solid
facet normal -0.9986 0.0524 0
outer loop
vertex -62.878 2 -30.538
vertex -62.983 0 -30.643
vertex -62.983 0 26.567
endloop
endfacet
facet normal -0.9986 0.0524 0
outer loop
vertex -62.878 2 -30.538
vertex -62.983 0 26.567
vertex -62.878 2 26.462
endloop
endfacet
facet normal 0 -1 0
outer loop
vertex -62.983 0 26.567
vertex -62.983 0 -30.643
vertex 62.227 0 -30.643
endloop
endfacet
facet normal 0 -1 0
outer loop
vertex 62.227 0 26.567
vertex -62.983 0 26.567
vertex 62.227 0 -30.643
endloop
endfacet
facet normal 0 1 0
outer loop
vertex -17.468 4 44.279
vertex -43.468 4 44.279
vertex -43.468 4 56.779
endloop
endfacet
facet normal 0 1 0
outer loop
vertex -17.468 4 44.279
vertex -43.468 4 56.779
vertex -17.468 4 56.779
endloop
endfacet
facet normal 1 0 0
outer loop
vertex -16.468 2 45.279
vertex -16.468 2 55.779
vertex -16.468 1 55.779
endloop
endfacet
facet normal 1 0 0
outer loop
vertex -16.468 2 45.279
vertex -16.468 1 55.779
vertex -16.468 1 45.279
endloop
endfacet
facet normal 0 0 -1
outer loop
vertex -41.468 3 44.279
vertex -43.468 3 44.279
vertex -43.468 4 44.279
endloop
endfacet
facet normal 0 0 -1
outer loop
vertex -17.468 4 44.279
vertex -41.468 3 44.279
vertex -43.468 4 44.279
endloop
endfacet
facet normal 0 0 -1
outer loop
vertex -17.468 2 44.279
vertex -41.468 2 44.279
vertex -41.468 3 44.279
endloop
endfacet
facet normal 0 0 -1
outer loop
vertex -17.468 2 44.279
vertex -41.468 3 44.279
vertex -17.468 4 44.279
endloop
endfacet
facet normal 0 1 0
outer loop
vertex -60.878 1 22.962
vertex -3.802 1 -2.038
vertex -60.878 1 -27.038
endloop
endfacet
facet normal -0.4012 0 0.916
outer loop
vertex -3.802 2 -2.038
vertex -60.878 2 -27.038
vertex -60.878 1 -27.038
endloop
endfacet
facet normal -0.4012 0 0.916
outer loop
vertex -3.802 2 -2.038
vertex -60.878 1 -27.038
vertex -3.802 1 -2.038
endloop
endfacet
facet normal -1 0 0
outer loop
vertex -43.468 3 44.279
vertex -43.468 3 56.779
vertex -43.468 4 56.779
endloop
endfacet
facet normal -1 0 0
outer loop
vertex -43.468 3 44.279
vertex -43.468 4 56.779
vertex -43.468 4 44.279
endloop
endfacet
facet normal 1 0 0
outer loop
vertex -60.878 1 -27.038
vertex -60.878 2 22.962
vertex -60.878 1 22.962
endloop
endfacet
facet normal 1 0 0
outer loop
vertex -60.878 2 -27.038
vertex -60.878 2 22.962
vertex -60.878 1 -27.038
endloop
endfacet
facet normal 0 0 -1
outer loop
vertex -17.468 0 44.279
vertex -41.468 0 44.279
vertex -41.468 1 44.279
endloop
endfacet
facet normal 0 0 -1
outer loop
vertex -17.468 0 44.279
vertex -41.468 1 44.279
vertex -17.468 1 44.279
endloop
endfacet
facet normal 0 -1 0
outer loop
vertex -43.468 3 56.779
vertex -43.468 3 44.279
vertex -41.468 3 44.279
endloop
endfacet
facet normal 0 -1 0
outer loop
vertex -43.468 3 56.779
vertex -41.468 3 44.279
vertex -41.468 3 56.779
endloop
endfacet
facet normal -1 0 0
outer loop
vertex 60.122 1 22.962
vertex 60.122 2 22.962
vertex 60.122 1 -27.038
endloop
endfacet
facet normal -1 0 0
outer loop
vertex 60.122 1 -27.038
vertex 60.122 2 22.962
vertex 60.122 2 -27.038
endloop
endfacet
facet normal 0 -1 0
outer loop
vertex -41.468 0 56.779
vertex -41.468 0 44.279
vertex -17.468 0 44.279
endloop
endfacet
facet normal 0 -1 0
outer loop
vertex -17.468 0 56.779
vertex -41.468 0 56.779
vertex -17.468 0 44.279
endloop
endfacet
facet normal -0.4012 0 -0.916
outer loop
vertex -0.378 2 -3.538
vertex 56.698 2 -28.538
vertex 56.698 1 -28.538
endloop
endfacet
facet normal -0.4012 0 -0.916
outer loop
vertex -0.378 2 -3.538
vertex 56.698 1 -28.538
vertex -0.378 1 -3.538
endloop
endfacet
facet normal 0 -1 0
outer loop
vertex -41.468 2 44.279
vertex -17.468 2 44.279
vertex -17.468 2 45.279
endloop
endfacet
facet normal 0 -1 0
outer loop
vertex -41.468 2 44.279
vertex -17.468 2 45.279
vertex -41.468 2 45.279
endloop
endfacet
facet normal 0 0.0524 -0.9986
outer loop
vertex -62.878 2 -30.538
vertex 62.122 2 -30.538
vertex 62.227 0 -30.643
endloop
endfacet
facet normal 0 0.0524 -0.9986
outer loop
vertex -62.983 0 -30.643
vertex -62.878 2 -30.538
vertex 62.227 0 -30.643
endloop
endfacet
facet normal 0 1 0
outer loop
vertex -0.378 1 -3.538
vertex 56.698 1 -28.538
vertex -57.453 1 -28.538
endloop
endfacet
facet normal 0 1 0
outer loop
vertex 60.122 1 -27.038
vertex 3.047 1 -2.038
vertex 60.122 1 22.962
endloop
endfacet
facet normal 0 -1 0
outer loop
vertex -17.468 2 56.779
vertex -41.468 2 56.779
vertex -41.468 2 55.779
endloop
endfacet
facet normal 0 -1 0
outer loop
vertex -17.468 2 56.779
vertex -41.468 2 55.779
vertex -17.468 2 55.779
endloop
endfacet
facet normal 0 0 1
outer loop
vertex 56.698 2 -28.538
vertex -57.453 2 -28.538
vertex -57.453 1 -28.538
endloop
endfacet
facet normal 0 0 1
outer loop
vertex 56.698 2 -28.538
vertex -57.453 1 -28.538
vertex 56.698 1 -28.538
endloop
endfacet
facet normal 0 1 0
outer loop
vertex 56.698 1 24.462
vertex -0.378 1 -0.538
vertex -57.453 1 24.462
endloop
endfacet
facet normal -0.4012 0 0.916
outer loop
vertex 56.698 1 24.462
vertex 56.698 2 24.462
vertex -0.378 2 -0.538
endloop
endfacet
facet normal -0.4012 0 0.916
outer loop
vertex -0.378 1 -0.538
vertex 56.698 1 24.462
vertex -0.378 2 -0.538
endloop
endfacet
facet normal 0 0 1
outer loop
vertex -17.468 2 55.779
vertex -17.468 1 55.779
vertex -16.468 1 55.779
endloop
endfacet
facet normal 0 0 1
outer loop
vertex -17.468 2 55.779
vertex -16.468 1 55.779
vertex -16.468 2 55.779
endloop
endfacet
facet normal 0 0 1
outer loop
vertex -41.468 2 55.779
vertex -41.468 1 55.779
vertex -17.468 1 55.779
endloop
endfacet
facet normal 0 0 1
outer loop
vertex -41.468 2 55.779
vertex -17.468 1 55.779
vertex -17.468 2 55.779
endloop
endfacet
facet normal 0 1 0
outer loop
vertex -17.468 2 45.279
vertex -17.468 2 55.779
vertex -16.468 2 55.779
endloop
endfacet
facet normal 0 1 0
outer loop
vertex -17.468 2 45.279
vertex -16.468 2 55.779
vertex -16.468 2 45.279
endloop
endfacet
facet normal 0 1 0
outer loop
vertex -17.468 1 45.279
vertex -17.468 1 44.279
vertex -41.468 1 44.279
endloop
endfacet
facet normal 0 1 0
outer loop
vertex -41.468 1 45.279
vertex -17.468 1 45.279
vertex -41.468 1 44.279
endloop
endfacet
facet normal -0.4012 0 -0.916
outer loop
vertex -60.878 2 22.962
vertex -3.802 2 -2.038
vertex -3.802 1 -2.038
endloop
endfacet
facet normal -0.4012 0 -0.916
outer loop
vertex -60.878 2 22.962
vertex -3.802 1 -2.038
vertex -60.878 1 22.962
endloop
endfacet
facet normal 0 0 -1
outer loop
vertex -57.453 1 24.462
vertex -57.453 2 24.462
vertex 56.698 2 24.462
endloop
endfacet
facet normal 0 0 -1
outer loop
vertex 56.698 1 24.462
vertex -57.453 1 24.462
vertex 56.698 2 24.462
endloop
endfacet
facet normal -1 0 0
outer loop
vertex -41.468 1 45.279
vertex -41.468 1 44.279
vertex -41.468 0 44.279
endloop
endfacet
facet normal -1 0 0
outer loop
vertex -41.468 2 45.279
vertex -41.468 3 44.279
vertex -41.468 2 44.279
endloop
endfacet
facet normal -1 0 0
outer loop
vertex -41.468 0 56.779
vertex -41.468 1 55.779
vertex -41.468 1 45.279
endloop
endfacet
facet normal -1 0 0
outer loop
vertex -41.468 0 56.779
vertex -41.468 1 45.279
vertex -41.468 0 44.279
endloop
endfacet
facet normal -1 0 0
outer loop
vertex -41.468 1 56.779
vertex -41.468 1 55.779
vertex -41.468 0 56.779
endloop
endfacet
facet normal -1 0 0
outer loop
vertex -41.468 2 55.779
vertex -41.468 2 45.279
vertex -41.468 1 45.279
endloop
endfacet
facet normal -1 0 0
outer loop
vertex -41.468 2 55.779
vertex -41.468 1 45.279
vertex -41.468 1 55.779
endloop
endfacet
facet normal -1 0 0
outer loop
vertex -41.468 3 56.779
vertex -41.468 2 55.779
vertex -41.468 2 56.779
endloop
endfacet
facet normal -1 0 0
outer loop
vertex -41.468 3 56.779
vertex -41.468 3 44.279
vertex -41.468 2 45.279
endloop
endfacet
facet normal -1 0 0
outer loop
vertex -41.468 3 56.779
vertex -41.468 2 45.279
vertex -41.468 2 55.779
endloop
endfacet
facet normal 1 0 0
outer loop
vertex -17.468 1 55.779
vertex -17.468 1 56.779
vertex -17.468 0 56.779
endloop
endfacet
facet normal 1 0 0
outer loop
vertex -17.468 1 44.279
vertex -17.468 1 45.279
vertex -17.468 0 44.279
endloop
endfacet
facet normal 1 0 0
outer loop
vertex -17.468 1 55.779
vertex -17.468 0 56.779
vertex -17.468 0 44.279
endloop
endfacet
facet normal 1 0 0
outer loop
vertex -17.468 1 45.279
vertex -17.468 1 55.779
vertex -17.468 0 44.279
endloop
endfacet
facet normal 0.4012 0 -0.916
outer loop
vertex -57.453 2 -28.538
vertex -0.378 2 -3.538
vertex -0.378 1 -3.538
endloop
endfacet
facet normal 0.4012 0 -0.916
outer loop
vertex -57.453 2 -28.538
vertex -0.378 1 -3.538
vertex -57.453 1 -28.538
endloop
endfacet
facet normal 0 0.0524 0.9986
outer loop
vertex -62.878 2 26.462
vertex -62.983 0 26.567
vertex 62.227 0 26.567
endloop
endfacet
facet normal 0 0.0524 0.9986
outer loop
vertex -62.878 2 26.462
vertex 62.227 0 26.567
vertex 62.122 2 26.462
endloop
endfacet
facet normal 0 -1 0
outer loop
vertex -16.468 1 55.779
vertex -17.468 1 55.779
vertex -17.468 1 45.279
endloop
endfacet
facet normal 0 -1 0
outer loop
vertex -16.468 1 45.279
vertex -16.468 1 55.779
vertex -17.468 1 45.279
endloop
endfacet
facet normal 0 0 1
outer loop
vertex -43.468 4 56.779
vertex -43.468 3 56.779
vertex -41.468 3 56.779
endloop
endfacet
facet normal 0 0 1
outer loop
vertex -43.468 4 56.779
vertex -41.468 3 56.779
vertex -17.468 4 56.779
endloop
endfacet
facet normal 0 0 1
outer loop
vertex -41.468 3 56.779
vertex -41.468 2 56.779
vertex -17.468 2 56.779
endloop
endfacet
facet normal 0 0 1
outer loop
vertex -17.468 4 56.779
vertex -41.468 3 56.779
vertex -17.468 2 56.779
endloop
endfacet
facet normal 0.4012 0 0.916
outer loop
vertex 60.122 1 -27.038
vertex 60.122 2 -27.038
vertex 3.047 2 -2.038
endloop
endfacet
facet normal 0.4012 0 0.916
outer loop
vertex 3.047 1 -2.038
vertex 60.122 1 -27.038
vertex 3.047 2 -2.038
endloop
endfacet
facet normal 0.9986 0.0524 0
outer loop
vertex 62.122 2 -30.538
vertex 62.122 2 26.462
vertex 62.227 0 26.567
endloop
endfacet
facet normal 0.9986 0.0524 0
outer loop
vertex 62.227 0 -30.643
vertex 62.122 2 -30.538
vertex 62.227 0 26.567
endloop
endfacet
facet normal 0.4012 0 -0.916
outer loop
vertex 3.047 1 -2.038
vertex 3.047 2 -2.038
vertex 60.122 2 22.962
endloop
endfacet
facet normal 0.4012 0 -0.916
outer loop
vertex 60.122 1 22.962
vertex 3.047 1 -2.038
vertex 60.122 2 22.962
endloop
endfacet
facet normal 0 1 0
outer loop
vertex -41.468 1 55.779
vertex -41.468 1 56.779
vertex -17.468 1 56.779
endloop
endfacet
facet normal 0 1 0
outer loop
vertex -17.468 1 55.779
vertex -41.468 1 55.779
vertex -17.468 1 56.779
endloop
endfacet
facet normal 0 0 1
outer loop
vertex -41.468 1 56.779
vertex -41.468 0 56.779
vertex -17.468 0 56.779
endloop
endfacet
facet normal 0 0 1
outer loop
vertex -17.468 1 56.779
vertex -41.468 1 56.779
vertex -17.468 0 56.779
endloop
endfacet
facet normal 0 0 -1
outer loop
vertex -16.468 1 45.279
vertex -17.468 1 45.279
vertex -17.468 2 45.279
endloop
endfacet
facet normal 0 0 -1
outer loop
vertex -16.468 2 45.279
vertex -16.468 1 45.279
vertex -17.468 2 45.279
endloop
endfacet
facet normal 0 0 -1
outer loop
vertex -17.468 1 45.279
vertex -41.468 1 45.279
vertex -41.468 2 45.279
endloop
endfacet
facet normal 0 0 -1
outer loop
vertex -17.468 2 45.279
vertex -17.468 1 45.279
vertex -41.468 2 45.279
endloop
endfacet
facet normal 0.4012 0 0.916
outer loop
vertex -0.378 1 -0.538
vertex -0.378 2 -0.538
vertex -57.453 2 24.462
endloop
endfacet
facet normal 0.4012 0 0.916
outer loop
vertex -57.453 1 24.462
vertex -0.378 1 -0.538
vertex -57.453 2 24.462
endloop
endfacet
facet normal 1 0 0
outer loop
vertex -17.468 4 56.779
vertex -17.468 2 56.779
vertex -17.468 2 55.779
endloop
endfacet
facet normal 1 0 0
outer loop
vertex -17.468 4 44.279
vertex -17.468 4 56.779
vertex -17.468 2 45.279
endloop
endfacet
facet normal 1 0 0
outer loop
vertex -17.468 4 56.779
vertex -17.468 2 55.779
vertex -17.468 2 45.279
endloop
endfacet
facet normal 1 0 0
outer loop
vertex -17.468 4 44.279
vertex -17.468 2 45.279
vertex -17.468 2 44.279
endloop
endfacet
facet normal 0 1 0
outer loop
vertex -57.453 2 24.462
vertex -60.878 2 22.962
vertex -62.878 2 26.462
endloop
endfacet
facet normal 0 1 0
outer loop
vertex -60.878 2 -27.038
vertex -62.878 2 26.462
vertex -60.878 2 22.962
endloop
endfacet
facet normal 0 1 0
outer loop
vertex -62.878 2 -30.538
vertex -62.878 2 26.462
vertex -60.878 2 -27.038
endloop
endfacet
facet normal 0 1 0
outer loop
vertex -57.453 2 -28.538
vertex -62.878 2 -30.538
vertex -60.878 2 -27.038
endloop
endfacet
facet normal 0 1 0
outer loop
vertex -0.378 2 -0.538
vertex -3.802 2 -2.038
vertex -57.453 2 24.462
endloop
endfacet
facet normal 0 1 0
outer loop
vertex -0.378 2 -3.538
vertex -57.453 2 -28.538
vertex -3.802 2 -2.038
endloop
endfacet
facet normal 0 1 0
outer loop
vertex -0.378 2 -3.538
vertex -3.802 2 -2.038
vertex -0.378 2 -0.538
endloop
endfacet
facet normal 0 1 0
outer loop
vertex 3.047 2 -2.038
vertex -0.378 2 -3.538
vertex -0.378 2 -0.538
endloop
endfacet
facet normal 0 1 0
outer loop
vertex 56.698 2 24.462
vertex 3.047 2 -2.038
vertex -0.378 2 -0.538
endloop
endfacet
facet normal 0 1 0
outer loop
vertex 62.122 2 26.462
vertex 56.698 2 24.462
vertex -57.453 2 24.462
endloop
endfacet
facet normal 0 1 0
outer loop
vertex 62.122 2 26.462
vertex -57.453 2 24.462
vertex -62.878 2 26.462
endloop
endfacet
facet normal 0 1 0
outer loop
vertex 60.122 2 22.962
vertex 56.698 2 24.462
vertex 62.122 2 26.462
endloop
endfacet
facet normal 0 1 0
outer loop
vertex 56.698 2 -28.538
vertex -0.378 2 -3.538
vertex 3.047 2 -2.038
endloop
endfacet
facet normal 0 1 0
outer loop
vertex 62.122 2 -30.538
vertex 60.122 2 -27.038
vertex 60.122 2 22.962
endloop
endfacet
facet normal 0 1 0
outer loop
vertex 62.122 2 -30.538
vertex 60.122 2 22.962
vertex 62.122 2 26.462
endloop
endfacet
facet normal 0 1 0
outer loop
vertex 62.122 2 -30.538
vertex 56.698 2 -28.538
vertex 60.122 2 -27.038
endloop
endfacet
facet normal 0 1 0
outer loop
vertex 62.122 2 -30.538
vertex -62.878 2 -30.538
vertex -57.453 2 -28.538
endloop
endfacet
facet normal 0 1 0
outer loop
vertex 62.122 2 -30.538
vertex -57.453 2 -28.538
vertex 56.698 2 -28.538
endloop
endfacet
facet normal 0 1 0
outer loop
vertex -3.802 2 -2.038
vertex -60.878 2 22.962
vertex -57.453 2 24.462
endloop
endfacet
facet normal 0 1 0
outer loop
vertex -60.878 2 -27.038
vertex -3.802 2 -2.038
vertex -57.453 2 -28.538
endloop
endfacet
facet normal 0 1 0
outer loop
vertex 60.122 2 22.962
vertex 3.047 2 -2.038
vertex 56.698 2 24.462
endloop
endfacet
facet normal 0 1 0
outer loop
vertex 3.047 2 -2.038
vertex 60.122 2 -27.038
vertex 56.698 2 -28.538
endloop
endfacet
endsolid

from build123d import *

# Parameters (mm, degrees)
SKETCH1_W           = 128
SKETCH1_H           = 60
BOSS_EXTRUDE1_DEPTH = 2
GROOVE2_START       = -32.037780401
GROOVE2_OUTLINE_W   = 128
GROOVE2_OUTLINE_H   = 2
GROOVE2_DEPTH       = 1.395184441
GROOVE2_START_2     = 26.567035157
GROOVE2_2_OUTLINE_W = 128
GROOVE2_2_OUTLINE_H = 2
GROOVE2_2_DEPTH     = 1.395184442
GROOVE2_3_DEPTH     = 60
GROOVE2_START_3     = -64
GROOVE2_4_DEPTH     = 127
CUT_EXTRUDE1_DEPTH  = 1
SKETCH6_W           = 26
SKETCH6_H           = 12.5
BOSS_EXTRUDE2_DEPTH = 4
SKETCH7_W           = 26
SKETCH7_H           = 1
CUT_EXTRUDE2_DEPTH  = 1
SKETCH8_W           = 26
SKETCH8_H           = 1
CUT_EXTRUDE3_DEPTH  = 1
SKETCH10_W          = 10.5
SKETCH10_H          = 1
BOSS_EXTRUDE3_DEPTH = 1
SKETCH11_W          = 12.5
SKETCH11_H          = 3
CUT_EXTRUDE4_DEPTH  = 2


with BuildPart() as part:
    # Sketch1 → Boss-Extrude1 (new body)
    with BuildSketch(Plane(origin=(0, 0, 0), x_dir=(1, 0, 0), z_dir=(0, 1, 0))):
        with Locations((-0.377804014, 2.037780401)):
            Rectangle(SKETCH1_W, SKETCH1_H)
    extrude(amount=BOSS_EXTRUDE1_DEPTH)

    # Groove2: read off the stored shape, not the designer's step
    # Groove2 outline → Groove2 (cut)
    with BuildSketch(Plane.XY.offset(GROOVE2_START)):
        with Locations((-0.377804014, 1)):
            Rectangle(GROOVE2_OUTLINE_W, GROOVE2_OUTLINE_H)
    extrude(amount=GROOVE2_DEPTH, mode=Mode.SUBTRACT)

    # Groove2 2 outline → Groove2 2 (cut)
    with BuildSketch(Plane.XY.offset(GROOVE2_START_2)):
        with Locations((-0.377804014, 1)):
            Rectangle(GROOVE2_2_OUTLINE_W, GROOVE2_2_OUTLINE_H)
    extrude(amount=GROOVE2_2_DEPTH, mode=Mode.SUBTRACT)

    # Groove2 3 outline → Groove2 3 (cut)
    with BuildSketch(Plane.XY.offset(GROOVE2_START)):
        Polygon((63.622195986, 2), (62.122195986, 2), (62.227011544, 0), (63.622195986, 0), align=None)
        Polygon((-62.982619573, 0), (-62.877804014, 2), (-64.377804014, 2), (-64.377804014, 0), align=None)
    extrude(amount=GROOVE2_3_DEPTH, mode=Mode.SUBTRACT)

    # Groove2 4 outline → Groove2 4 (cut)
    with BuildSketch(Plane.YZ.offset(GROOVE2_START_3)):
        Polygon((2, 26.567035157), (0, 26.567035157), (2, 26.462219599), align=None)
        Polygon((2, -30.64259596), (2, -30.537780401), (0, -30.64259596), align=None)
    extrude(amount=GROOVE2_4_DEPTH, mode=Mode.SUBTRACT)

    # Sketch4 → Cut-Extrude1 (cut)
    with BuildSketch(Plane(origin=(0, 2, 0), x_dir=(1, 0, 0), z_dir=(0, 1, 0))):
        Polygon((-57.453275712, -24.462219599), (56.697667684, -24.462219599), (-0.377804014, 0.537780401), align=None)
        Polygon((-60.877804014, -22.962219599), (-60.877804014, 27.037780401), (-3.802332316, 2.037780401), align=None)
        Polygon((-57.453275712, 28.537780401), (56.697667684, 28.537780401), (-0.377804014, 3.537780401), align=None)
        Polygon((60.122195986, -22.962219599), (60.122195986, 27.037780401), (3.046724288, 2.037780401), align=None)
    extrude(amount=-CUT_EXTRUDE1_DEPTH, mode=Mode.SUBTRACT)


with BuildPart() as body_2:
    # Sketch6 → Boss-Extrude2 (new body)
    with BuildSketch(Plane(origin=(0, 0, 0), x_dir=(1, 0, 0), z_dir=(0, 1, 0))):
        with Locations((-30.467681851, -50.528824738)):
            Rectangle(SKETCH6_W, SKETCH6_H)
    extrude(amount=BOSS_EXTRUDE2_DEPTH)

    # Sketch7 → Cut-Extrude2 (cut)
    with BuildSketch(Plane.XY.offset(56.778824738)):
        with Locations((-30.467681851, 1.5)):
            Rectangle(SKETCH7_W, SKETCH7_H)
    extrude(amount=-CUT_EXTRUDE2_DEPTH, mode=Mode.SUBTRACT)

    # Sketch8 → Cut-Extrude3 (cut)
    with BuildSketch(Plane(origin=(0, 0, 44.278824738), x_dir=(-1, 0, 0), z_dir=(0, 0, -1))):
        with Locations((30.467681851, 1.5)):
            Rectangle(SKETCH8_W, SKETCH8_H)
    extrude(amount=-CUT_EXTRUDE3_DEPTH, mode=Mode.SUBTRACT)

    # Sketch10 → Boss-Extrude3 (add)
    with BuildSketch(Plane(origin=(-17.467681851, 0, 0), x_dir=(0, 0, -1), z_dir=(1, 0, 0))):
        with Locations((-50.528824738, 1.5)):
            Rectangle(SKETCH10_W, SKETCH10_H)
    extrude(amount=BOSS_EXTRUDE3_DEPTH)

    # Sketch11 → Cut-Extrude4 (cut)
    with BuildSketch(Plane.ZY.offset(43.467681851)):
        with Locations((50.528824738, 1.5)):
            Rectangle(SKETCH11_W, SKETCH11_H)
    extrude(amount=-CUT_EXTRUDE4_DEPTH, mode=Mode.SUBTRACT)


solid = Compound([part.part, body_2.part])
